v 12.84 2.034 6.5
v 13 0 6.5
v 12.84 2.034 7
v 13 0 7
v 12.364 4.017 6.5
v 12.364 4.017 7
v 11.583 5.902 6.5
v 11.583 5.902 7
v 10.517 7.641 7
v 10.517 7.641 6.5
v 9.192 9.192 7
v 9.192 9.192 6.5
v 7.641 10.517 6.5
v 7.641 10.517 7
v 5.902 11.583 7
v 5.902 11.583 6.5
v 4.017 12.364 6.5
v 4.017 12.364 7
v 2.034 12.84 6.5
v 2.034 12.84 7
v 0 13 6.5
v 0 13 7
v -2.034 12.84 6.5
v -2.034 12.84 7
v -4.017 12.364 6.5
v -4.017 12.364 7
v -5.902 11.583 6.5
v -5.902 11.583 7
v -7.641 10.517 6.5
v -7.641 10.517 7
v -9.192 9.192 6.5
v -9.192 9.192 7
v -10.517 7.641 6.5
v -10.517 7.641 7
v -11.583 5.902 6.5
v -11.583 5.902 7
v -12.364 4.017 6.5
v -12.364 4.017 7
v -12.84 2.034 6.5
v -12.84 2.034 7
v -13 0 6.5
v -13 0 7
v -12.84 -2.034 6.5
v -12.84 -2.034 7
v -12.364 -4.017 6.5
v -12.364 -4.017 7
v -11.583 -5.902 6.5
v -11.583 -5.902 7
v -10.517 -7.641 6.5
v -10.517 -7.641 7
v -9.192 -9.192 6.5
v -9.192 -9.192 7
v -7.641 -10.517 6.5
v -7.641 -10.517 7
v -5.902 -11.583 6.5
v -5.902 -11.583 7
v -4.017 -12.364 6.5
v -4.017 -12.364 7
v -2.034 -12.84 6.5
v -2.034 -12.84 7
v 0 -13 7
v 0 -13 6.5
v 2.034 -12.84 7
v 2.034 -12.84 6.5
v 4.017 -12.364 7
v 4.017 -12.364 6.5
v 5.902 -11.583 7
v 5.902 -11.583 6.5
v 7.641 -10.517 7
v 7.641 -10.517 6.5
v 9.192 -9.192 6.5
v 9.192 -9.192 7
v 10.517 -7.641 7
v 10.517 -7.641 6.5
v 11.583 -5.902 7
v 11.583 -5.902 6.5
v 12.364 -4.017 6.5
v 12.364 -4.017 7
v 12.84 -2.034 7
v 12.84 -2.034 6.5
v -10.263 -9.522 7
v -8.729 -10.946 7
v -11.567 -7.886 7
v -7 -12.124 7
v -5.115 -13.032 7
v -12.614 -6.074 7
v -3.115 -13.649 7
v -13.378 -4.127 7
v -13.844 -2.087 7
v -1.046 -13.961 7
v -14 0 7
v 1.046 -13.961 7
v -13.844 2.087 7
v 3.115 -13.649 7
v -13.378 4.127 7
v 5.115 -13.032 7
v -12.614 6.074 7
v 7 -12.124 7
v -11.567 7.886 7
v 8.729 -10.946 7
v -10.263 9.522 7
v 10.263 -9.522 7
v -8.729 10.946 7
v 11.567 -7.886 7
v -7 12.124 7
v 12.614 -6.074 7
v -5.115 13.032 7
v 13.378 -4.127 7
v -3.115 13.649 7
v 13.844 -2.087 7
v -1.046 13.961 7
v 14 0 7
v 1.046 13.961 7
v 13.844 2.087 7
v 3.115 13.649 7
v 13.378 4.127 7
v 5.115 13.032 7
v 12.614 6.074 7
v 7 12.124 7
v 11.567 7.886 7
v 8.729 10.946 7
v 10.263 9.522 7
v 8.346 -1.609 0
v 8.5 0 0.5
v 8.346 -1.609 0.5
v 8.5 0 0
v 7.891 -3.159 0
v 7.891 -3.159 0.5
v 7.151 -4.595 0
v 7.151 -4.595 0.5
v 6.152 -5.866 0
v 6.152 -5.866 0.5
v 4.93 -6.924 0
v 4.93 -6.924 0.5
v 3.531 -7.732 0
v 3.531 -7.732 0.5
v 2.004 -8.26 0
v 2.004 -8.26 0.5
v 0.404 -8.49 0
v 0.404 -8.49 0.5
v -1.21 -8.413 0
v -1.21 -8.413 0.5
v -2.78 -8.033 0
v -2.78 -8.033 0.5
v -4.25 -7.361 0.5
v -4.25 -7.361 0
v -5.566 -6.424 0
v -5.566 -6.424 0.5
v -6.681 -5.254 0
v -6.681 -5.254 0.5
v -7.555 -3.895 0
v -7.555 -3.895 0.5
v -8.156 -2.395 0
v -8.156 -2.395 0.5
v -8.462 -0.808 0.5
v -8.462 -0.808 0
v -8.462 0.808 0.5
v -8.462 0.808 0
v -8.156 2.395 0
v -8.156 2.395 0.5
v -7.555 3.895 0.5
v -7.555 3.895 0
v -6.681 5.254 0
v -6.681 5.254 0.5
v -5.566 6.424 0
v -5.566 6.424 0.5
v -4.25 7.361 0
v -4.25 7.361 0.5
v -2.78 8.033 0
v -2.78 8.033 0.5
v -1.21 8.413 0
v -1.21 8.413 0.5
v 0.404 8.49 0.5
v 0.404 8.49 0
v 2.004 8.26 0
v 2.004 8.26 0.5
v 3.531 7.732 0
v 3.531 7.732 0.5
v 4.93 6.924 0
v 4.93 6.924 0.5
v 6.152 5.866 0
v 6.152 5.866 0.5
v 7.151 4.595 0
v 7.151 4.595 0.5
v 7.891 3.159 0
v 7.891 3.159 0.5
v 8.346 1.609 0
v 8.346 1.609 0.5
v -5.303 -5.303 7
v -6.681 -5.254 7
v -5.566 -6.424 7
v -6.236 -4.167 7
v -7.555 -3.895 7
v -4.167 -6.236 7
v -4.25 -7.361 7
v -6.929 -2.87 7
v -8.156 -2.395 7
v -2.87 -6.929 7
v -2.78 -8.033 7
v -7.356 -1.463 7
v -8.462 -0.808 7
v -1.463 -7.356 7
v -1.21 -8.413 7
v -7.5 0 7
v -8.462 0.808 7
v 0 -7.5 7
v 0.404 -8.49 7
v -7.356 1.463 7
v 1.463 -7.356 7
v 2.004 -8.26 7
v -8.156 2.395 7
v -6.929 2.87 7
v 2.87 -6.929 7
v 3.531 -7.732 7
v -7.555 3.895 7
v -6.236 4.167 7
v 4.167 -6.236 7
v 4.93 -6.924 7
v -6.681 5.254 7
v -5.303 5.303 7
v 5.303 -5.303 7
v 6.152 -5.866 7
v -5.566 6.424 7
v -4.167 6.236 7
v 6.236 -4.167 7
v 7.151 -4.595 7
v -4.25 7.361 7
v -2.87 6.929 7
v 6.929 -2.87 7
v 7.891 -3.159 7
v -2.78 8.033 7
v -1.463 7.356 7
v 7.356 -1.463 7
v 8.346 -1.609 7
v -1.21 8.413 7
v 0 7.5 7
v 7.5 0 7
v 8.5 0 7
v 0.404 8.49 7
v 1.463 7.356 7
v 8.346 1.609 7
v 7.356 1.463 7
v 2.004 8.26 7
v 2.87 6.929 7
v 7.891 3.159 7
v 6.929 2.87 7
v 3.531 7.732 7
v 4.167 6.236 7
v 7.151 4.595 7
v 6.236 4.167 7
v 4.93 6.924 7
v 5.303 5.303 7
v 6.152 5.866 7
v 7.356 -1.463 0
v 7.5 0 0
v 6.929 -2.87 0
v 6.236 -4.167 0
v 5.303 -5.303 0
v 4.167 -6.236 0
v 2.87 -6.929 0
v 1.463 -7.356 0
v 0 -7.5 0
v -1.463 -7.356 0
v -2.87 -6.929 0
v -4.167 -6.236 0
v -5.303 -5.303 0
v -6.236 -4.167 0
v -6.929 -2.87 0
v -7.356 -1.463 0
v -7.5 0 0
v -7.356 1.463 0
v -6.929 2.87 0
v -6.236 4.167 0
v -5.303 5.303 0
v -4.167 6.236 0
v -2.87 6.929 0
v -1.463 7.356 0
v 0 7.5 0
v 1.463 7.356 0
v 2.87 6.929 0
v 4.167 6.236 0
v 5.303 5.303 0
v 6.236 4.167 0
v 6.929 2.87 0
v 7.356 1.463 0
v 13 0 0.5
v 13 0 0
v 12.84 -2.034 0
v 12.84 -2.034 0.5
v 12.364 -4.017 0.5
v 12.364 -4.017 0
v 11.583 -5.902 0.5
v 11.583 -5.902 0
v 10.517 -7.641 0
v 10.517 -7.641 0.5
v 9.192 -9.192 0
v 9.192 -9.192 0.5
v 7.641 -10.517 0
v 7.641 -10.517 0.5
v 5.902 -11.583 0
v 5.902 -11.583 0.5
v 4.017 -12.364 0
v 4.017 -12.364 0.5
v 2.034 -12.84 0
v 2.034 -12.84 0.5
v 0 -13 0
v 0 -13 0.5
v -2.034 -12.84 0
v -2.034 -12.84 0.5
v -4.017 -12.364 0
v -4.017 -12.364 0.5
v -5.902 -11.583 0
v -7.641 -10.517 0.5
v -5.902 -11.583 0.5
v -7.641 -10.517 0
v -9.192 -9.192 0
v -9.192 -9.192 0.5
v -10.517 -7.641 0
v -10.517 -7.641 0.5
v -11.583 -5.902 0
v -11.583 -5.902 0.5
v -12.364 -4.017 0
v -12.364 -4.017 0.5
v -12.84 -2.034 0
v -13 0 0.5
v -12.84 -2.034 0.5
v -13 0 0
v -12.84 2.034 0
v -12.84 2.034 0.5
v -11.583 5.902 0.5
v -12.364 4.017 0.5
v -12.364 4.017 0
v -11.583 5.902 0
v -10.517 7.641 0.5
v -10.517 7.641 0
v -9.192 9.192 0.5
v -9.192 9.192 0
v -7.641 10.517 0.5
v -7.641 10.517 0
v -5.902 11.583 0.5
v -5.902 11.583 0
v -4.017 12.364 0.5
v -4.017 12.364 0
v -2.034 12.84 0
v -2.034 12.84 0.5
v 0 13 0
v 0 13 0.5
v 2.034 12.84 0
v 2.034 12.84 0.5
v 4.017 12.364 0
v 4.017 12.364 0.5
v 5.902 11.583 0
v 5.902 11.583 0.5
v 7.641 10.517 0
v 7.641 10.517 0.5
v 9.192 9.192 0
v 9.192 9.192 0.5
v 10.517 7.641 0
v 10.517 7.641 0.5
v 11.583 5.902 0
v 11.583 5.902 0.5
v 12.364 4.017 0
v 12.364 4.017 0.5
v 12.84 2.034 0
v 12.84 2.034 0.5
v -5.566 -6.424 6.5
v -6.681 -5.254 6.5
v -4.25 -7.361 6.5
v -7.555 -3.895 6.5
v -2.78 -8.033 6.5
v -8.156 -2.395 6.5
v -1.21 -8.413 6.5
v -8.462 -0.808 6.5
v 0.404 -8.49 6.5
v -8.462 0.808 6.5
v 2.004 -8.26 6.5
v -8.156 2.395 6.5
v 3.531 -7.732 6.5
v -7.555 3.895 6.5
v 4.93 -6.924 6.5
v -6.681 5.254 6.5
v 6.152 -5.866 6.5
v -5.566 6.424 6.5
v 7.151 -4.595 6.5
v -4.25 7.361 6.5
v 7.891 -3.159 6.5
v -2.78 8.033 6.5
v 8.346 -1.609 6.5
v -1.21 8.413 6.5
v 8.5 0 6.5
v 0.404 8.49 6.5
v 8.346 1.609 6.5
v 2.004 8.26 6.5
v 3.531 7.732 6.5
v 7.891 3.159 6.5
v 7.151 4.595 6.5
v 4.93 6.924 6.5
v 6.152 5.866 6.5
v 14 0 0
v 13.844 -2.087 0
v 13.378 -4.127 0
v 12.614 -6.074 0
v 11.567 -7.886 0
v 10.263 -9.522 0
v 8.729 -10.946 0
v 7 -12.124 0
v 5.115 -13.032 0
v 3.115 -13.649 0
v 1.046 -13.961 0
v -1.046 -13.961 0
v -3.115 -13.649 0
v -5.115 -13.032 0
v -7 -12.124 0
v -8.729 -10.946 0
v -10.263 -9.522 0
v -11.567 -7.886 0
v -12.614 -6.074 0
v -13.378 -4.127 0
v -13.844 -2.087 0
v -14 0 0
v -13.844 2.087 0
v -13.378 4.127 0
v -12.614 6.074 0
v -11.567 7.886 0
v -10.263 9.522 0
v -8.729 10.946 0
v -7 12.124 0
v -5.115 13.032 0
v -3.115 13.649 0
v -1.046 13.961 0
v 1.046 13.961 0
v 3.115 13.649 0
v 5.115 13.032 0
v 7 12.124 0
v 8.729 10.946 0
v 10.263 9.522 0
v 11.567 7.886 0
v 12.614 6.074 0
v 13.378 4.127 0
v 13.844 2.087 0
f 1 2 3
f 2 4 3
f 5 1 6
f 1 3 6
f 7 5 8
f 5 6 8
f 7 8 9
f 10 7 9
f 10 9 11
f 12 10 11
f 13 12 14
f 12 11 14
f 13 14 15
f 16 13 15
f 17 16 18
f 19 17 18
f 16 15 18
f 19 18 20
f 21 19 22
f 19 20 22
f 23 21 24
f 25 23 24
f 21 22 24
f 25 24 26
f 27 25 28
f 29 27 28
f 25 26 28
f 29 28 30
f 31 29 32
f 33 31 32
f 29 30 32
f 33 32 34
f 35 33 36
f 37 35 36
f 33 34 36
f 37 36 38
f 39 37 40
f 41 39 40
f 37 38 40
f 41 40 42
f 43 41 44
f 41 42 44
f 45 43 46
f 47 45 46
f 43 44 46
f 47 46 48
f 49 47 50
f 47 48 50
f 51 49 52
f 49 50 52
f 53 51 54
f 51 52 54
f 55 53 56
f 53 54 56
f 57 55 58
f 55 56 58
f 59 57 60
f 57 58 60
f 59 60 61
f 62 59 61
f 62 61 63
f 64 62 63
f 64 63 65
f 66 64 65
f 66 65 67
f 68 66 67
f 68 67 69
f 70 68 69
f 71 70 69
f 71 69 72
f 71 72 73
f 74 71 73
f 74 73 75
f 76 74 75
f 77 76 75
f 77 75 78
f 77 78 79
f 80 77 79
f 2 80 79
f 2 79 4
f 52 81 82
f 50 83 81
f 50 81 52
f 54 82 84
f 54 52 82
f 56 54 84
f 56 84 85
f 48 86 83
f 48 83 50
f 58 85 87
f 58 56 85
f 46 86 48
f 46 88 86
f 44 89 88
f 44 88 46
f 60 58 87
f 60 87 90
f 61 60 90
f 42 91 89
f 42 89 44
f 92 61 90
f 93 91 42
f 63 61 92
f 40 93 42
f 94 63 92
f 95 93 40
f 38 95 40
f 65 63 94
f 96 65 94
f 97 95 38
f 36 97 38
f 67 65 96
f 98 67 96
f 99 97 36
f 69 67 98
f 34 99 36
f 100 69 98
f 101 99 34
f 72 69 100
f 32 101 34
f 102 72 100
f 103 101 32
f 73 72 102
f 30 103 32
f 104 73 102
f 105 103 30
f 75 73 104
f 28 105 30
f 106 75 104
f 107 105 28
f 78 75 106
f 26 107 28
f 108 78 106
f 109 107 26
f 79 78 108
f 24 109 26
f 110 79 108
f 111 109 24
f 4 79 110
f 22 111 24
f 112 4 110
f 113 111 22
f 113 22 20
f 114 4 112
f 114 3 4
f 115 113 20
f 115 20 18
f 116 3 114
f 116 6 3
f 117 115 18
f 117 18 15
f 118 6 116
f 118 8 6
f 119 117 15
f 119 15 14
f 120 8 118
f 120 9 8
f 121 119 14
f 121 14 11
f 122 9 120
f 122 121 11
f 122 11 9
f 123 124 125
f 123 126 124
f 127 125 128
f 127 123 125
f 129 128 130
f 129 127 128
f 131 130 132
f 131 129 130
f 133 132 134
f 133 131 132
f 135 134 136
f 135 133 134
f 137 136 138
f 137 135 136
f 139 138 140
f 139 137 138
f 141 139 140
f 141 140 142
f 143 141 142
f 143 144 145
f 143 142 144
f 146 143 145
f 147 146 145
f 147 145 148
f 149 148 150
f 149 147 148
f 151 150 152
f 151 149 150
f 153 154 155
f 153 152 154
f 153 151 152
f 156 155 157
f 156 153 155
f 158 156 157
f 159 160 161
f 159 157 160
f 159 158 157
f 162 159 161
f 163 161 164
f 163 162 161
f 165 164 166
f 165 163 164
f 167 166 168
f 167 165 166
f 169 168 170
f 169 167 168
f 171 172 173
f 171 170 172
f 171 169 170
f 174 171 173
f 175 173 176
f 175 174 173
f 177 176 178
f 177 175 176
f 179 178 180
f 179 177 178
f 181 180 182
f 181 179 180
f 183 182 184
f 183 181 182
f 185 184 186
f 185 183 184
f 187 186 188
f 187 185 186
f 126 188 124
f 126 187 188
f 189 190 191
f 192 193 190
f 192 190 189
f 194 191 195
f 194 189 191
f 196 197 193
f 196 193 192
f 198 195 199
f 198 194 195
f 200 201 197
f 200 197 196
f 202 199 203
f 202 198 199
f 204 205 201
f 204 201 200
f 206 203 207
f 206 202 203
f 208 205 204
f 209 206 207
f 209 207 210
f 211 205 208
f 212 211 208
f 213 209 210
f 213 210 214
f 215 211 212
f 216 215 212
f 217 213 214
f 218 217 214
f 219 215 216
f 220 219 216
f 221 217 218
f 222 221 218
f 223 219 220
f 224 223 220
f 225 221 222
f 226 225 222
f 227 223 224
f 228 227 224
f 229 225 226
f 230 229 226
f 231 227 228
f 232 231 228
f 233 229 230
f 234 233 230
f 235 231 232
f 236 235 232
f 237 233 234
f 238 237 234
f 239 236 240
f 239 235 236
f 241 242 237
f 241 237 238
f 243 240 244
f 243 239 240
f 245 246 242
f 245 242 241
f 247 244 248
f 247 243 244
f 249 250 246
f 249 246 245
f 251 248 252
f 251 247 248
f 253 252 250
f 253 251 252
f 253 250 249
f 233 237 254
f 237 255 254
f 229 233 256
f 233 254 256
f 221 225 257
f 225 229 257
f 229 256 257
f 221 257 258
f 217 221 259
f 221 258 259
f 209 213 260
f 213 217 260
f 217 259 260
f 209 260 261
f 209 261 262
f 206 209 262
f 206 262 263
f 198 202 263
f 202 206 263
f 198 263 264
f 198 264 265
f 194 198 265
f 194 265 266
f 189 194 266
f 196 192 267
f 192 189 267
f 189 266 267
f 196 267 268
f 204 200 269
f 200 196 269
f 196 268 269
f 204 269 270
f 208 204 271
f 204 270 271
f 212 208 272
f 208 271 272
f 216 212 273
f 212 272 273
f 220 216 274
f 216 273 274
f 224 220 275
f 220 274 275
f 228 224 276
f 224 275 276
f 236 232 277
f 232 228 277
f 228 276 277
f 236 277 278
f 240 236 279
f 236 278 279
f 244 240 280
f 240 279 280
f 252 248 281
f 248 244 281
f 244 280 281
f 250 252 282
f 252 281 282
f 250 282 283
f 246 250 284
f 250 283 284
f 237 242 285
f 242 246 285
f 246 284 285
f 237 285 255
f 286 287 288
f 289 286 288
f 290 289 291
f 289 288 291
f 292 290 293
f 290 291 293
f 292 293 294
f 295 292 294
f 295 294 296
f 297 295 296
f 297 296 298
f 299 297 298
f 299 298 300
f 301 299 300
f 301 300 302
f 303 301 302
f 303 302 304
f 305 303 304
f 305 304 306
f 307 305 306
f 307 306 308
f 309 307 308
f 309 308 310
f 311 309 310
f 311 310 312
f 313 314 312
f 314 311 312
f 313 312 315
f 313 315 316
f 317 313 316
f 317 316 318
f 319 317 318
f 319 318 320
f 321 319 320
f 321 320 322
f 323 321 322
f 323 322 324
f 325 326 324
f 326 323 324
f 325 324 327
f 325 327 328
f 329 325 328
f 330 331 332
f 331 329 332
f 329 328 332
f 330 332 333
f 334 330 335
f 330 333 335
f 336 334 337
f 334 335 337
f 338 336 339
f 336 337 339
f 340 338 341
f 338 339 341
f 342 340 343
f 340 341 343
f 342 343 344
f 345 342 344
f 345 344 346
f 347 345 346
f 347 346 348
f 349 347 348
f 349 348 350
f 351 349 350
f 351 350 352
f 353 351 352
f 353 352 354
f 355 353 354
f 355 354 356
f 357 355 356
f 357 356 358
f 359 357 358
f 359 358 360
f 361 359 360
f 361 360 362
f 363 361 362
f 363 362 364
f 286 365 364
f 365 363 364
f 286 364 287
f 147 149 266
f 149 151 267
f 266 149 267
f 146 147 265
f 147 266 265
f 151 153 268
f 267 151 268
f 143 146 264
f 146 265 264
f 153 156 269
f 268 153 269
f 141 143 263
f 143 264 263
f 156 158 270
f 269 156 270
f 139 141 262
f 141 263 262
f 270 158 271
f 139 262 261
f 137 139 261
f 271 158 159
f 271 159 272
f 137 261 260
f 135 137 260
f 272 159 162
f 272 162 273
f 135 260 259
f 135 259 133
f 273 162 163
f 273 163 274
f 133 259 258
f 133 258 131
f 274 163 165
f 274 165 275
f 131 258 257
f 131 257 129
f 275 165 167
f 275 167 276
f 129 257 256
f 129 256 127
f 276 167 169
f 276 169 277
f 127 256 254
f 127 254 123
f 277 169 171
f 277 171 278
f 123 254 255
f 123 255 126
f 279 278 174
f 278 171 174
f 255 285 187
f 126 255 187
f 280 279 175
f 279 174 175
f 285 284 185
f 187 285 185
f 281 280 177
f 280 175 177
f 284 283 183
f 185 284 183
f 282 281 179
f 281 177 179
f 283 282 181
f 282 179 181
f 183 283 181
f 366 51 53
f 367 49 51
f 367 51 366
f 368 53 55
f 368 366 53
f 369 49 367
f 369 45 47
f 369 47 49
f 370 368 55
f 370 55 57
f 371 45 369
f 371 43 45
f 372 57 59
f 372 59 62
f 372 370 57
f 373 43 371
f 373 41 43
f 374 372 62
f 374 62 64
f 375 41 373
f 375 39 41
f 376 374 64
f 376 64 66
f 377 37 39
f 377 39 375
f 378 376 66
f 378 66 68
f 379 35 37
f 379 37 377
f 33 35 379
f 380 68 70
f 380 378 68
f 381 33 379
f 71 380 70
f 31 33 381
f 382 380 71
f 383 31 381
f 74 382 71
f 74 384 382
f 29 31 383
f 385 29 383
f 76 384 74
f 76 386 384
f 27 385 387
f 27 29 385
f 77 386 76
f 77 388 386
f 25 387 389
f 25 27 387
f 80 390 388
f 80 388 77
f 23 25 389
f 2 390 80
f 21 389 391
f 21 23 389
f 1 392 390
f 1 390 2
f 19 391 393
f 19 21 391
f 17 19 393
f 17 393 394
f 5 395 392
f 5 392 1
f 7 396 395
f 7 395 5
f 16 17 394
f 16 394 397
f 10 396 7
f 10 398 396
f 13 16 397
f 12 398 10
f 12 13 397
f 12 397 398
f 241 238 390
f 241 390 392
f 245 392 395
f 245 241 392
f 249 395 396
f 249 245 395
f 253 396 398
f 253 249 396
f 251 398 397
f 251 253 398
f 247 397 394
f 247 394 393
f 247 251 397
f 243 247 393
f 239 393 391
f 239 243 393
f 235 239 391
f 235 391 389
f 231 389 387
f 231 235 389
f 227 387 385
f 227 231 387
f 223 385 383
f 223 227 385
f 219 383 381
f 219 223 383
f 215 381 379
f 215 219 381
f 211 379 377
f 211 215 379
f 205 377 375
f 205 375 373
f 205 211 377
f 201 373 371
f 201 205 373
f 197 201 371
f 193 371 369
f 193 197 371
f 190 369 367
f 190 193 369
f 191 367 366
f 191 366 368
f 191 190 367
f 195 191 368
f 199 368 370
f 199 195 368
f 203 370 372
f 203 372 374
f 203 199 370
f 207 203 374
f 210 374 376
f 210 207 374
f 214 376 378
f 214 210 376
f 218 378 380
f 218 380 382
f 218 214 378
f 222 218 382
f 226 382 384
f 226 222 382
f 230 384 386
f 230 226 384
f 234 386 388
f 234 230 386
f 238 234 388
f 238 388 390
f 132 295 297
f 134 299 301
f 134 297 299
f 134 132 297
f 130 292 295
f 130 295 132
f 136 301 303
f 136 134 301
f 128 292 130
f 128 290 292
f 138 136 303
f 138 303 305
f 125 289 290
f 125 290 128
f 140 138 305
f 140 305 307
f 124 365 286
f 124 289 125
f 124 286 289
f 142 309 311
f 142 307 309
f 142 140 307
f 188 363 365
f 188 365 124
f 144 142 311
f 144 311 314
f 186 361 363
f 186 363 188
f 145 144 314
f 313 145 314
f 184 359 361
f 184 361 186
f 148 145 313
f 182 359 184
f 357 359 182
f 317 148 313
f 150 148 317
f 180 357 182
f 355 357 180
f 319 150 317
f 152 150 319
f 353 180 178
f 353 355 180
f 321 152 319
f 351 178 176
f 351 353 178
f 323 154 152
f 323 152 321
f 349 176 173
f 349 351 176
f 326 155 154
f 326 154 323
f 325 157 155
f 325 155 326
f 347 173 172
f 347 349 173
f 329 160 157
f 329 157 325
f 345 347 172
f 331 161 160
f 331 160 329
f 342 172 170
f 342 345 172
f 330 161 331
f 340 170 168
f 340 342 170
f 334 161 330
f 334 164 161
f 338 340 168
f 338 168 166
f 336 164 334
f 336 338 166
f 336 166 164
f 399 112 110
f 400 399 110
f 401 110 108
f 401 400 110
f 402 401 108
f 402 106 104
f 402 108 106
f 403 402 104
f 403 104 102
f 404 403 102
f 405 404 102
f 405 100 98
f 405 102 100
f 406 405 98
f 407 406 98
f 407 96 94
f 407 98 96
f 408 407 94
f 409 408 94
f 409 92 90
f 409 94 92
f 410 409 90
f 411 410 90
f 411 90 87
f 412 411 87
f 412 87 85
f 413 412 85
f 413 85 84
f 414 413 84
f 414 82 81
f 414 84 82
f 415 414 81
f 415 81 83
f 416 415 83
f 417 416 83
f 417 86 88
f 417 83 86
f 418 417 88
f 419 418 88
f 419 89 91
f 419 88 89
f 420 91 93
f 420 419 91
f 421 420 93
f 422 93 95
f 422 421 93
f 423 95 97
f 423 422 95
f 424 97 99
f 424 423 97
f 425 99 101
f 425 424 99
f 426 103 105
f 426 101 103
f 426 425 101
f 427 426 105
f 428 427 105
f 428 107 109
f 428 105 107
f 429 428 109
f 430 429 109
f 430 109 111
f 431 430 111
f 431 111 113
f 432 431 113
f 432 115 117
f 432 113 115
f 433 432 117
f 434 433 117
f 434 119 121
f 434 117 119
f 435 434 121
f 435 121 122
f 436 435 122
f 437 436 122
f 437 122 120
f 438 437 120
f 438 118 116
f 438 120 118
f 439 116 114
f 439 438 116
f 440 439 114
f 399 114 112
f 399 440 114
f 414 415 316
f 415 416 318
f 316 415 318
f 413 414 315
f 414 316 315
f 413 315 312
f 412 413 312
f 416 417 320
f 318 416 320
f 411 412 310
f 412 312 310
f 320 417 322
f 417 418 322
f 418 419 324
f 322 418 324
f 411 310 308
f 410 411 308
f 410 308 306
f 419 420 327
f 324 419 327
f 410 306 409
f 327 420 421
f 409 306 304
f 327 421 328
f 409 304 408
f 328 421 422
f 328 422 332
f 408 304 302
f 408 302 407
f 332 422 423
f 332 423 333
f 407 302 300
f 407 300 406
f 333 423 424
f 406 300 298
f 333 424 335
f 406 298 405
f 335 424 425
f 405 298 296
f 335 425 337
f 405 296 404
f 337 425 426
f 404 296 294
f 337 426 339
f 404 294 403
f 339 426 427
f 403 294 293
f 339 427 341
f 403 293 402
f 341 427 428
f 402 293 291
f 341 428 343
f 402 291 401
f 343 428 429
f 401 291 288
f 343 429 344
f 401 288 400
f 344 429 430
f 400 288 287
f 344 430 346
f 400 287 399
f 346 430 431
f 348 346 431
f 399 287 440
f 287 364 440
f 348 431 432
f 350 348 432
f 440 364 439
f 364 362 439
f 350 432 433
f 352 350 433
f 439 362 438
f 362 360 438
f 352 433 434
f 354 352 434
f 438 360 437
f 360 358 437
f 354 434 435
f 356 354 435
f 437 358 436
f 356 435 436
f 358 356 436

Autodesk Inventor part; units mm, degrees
ref_plane "YZ Plane" through (0, 0, 0) normal (1, 0, 0) x (0, 1, 0)
ref_plane "XZ Plane" through (0, 0, 0) normal (0, 1, 0) x (-1, 0, 0)
sketch "Sketch1" plane through (0, 0, 0) normal (0, 0, 1) x (1, 0, 0)
  circle A0 centre (0, 0) radius 7.5
  circle A1 centre (0, 0) radius 14
  dimension "d0" = 15
  dimension "d1" = 28
extrude "Extrusion1" add sketch "Sketch1" along normal blind 7
sketch "Sketch2" plane through (0, 0, 7) normal (0, 0, 1) x (1, 0, 0)
  circle A0 centre (0, 0) radius 14 projected
  circle A1 centre (0, 0) radius 7.5 projected
  circle A2 centre (0, 0) radius 8.5
  circle A3 centre (0, 0) radius 13
  dimension "d4" = 1
  dimension "d5" = 1
extrude "Extrusion2" cut sketch "Sketch2" against normal blind 0.5 contours A3
ref_plane "Work Plane1" through (0, 0, 3.5) normal (0, 0, 1) x (1, 0, 0)
mirror "Mirror1" about plane through (0, 0, 3.5) normal (0, 0, 1) of "Extrusion2"
properties part number "6901 Bearing"
